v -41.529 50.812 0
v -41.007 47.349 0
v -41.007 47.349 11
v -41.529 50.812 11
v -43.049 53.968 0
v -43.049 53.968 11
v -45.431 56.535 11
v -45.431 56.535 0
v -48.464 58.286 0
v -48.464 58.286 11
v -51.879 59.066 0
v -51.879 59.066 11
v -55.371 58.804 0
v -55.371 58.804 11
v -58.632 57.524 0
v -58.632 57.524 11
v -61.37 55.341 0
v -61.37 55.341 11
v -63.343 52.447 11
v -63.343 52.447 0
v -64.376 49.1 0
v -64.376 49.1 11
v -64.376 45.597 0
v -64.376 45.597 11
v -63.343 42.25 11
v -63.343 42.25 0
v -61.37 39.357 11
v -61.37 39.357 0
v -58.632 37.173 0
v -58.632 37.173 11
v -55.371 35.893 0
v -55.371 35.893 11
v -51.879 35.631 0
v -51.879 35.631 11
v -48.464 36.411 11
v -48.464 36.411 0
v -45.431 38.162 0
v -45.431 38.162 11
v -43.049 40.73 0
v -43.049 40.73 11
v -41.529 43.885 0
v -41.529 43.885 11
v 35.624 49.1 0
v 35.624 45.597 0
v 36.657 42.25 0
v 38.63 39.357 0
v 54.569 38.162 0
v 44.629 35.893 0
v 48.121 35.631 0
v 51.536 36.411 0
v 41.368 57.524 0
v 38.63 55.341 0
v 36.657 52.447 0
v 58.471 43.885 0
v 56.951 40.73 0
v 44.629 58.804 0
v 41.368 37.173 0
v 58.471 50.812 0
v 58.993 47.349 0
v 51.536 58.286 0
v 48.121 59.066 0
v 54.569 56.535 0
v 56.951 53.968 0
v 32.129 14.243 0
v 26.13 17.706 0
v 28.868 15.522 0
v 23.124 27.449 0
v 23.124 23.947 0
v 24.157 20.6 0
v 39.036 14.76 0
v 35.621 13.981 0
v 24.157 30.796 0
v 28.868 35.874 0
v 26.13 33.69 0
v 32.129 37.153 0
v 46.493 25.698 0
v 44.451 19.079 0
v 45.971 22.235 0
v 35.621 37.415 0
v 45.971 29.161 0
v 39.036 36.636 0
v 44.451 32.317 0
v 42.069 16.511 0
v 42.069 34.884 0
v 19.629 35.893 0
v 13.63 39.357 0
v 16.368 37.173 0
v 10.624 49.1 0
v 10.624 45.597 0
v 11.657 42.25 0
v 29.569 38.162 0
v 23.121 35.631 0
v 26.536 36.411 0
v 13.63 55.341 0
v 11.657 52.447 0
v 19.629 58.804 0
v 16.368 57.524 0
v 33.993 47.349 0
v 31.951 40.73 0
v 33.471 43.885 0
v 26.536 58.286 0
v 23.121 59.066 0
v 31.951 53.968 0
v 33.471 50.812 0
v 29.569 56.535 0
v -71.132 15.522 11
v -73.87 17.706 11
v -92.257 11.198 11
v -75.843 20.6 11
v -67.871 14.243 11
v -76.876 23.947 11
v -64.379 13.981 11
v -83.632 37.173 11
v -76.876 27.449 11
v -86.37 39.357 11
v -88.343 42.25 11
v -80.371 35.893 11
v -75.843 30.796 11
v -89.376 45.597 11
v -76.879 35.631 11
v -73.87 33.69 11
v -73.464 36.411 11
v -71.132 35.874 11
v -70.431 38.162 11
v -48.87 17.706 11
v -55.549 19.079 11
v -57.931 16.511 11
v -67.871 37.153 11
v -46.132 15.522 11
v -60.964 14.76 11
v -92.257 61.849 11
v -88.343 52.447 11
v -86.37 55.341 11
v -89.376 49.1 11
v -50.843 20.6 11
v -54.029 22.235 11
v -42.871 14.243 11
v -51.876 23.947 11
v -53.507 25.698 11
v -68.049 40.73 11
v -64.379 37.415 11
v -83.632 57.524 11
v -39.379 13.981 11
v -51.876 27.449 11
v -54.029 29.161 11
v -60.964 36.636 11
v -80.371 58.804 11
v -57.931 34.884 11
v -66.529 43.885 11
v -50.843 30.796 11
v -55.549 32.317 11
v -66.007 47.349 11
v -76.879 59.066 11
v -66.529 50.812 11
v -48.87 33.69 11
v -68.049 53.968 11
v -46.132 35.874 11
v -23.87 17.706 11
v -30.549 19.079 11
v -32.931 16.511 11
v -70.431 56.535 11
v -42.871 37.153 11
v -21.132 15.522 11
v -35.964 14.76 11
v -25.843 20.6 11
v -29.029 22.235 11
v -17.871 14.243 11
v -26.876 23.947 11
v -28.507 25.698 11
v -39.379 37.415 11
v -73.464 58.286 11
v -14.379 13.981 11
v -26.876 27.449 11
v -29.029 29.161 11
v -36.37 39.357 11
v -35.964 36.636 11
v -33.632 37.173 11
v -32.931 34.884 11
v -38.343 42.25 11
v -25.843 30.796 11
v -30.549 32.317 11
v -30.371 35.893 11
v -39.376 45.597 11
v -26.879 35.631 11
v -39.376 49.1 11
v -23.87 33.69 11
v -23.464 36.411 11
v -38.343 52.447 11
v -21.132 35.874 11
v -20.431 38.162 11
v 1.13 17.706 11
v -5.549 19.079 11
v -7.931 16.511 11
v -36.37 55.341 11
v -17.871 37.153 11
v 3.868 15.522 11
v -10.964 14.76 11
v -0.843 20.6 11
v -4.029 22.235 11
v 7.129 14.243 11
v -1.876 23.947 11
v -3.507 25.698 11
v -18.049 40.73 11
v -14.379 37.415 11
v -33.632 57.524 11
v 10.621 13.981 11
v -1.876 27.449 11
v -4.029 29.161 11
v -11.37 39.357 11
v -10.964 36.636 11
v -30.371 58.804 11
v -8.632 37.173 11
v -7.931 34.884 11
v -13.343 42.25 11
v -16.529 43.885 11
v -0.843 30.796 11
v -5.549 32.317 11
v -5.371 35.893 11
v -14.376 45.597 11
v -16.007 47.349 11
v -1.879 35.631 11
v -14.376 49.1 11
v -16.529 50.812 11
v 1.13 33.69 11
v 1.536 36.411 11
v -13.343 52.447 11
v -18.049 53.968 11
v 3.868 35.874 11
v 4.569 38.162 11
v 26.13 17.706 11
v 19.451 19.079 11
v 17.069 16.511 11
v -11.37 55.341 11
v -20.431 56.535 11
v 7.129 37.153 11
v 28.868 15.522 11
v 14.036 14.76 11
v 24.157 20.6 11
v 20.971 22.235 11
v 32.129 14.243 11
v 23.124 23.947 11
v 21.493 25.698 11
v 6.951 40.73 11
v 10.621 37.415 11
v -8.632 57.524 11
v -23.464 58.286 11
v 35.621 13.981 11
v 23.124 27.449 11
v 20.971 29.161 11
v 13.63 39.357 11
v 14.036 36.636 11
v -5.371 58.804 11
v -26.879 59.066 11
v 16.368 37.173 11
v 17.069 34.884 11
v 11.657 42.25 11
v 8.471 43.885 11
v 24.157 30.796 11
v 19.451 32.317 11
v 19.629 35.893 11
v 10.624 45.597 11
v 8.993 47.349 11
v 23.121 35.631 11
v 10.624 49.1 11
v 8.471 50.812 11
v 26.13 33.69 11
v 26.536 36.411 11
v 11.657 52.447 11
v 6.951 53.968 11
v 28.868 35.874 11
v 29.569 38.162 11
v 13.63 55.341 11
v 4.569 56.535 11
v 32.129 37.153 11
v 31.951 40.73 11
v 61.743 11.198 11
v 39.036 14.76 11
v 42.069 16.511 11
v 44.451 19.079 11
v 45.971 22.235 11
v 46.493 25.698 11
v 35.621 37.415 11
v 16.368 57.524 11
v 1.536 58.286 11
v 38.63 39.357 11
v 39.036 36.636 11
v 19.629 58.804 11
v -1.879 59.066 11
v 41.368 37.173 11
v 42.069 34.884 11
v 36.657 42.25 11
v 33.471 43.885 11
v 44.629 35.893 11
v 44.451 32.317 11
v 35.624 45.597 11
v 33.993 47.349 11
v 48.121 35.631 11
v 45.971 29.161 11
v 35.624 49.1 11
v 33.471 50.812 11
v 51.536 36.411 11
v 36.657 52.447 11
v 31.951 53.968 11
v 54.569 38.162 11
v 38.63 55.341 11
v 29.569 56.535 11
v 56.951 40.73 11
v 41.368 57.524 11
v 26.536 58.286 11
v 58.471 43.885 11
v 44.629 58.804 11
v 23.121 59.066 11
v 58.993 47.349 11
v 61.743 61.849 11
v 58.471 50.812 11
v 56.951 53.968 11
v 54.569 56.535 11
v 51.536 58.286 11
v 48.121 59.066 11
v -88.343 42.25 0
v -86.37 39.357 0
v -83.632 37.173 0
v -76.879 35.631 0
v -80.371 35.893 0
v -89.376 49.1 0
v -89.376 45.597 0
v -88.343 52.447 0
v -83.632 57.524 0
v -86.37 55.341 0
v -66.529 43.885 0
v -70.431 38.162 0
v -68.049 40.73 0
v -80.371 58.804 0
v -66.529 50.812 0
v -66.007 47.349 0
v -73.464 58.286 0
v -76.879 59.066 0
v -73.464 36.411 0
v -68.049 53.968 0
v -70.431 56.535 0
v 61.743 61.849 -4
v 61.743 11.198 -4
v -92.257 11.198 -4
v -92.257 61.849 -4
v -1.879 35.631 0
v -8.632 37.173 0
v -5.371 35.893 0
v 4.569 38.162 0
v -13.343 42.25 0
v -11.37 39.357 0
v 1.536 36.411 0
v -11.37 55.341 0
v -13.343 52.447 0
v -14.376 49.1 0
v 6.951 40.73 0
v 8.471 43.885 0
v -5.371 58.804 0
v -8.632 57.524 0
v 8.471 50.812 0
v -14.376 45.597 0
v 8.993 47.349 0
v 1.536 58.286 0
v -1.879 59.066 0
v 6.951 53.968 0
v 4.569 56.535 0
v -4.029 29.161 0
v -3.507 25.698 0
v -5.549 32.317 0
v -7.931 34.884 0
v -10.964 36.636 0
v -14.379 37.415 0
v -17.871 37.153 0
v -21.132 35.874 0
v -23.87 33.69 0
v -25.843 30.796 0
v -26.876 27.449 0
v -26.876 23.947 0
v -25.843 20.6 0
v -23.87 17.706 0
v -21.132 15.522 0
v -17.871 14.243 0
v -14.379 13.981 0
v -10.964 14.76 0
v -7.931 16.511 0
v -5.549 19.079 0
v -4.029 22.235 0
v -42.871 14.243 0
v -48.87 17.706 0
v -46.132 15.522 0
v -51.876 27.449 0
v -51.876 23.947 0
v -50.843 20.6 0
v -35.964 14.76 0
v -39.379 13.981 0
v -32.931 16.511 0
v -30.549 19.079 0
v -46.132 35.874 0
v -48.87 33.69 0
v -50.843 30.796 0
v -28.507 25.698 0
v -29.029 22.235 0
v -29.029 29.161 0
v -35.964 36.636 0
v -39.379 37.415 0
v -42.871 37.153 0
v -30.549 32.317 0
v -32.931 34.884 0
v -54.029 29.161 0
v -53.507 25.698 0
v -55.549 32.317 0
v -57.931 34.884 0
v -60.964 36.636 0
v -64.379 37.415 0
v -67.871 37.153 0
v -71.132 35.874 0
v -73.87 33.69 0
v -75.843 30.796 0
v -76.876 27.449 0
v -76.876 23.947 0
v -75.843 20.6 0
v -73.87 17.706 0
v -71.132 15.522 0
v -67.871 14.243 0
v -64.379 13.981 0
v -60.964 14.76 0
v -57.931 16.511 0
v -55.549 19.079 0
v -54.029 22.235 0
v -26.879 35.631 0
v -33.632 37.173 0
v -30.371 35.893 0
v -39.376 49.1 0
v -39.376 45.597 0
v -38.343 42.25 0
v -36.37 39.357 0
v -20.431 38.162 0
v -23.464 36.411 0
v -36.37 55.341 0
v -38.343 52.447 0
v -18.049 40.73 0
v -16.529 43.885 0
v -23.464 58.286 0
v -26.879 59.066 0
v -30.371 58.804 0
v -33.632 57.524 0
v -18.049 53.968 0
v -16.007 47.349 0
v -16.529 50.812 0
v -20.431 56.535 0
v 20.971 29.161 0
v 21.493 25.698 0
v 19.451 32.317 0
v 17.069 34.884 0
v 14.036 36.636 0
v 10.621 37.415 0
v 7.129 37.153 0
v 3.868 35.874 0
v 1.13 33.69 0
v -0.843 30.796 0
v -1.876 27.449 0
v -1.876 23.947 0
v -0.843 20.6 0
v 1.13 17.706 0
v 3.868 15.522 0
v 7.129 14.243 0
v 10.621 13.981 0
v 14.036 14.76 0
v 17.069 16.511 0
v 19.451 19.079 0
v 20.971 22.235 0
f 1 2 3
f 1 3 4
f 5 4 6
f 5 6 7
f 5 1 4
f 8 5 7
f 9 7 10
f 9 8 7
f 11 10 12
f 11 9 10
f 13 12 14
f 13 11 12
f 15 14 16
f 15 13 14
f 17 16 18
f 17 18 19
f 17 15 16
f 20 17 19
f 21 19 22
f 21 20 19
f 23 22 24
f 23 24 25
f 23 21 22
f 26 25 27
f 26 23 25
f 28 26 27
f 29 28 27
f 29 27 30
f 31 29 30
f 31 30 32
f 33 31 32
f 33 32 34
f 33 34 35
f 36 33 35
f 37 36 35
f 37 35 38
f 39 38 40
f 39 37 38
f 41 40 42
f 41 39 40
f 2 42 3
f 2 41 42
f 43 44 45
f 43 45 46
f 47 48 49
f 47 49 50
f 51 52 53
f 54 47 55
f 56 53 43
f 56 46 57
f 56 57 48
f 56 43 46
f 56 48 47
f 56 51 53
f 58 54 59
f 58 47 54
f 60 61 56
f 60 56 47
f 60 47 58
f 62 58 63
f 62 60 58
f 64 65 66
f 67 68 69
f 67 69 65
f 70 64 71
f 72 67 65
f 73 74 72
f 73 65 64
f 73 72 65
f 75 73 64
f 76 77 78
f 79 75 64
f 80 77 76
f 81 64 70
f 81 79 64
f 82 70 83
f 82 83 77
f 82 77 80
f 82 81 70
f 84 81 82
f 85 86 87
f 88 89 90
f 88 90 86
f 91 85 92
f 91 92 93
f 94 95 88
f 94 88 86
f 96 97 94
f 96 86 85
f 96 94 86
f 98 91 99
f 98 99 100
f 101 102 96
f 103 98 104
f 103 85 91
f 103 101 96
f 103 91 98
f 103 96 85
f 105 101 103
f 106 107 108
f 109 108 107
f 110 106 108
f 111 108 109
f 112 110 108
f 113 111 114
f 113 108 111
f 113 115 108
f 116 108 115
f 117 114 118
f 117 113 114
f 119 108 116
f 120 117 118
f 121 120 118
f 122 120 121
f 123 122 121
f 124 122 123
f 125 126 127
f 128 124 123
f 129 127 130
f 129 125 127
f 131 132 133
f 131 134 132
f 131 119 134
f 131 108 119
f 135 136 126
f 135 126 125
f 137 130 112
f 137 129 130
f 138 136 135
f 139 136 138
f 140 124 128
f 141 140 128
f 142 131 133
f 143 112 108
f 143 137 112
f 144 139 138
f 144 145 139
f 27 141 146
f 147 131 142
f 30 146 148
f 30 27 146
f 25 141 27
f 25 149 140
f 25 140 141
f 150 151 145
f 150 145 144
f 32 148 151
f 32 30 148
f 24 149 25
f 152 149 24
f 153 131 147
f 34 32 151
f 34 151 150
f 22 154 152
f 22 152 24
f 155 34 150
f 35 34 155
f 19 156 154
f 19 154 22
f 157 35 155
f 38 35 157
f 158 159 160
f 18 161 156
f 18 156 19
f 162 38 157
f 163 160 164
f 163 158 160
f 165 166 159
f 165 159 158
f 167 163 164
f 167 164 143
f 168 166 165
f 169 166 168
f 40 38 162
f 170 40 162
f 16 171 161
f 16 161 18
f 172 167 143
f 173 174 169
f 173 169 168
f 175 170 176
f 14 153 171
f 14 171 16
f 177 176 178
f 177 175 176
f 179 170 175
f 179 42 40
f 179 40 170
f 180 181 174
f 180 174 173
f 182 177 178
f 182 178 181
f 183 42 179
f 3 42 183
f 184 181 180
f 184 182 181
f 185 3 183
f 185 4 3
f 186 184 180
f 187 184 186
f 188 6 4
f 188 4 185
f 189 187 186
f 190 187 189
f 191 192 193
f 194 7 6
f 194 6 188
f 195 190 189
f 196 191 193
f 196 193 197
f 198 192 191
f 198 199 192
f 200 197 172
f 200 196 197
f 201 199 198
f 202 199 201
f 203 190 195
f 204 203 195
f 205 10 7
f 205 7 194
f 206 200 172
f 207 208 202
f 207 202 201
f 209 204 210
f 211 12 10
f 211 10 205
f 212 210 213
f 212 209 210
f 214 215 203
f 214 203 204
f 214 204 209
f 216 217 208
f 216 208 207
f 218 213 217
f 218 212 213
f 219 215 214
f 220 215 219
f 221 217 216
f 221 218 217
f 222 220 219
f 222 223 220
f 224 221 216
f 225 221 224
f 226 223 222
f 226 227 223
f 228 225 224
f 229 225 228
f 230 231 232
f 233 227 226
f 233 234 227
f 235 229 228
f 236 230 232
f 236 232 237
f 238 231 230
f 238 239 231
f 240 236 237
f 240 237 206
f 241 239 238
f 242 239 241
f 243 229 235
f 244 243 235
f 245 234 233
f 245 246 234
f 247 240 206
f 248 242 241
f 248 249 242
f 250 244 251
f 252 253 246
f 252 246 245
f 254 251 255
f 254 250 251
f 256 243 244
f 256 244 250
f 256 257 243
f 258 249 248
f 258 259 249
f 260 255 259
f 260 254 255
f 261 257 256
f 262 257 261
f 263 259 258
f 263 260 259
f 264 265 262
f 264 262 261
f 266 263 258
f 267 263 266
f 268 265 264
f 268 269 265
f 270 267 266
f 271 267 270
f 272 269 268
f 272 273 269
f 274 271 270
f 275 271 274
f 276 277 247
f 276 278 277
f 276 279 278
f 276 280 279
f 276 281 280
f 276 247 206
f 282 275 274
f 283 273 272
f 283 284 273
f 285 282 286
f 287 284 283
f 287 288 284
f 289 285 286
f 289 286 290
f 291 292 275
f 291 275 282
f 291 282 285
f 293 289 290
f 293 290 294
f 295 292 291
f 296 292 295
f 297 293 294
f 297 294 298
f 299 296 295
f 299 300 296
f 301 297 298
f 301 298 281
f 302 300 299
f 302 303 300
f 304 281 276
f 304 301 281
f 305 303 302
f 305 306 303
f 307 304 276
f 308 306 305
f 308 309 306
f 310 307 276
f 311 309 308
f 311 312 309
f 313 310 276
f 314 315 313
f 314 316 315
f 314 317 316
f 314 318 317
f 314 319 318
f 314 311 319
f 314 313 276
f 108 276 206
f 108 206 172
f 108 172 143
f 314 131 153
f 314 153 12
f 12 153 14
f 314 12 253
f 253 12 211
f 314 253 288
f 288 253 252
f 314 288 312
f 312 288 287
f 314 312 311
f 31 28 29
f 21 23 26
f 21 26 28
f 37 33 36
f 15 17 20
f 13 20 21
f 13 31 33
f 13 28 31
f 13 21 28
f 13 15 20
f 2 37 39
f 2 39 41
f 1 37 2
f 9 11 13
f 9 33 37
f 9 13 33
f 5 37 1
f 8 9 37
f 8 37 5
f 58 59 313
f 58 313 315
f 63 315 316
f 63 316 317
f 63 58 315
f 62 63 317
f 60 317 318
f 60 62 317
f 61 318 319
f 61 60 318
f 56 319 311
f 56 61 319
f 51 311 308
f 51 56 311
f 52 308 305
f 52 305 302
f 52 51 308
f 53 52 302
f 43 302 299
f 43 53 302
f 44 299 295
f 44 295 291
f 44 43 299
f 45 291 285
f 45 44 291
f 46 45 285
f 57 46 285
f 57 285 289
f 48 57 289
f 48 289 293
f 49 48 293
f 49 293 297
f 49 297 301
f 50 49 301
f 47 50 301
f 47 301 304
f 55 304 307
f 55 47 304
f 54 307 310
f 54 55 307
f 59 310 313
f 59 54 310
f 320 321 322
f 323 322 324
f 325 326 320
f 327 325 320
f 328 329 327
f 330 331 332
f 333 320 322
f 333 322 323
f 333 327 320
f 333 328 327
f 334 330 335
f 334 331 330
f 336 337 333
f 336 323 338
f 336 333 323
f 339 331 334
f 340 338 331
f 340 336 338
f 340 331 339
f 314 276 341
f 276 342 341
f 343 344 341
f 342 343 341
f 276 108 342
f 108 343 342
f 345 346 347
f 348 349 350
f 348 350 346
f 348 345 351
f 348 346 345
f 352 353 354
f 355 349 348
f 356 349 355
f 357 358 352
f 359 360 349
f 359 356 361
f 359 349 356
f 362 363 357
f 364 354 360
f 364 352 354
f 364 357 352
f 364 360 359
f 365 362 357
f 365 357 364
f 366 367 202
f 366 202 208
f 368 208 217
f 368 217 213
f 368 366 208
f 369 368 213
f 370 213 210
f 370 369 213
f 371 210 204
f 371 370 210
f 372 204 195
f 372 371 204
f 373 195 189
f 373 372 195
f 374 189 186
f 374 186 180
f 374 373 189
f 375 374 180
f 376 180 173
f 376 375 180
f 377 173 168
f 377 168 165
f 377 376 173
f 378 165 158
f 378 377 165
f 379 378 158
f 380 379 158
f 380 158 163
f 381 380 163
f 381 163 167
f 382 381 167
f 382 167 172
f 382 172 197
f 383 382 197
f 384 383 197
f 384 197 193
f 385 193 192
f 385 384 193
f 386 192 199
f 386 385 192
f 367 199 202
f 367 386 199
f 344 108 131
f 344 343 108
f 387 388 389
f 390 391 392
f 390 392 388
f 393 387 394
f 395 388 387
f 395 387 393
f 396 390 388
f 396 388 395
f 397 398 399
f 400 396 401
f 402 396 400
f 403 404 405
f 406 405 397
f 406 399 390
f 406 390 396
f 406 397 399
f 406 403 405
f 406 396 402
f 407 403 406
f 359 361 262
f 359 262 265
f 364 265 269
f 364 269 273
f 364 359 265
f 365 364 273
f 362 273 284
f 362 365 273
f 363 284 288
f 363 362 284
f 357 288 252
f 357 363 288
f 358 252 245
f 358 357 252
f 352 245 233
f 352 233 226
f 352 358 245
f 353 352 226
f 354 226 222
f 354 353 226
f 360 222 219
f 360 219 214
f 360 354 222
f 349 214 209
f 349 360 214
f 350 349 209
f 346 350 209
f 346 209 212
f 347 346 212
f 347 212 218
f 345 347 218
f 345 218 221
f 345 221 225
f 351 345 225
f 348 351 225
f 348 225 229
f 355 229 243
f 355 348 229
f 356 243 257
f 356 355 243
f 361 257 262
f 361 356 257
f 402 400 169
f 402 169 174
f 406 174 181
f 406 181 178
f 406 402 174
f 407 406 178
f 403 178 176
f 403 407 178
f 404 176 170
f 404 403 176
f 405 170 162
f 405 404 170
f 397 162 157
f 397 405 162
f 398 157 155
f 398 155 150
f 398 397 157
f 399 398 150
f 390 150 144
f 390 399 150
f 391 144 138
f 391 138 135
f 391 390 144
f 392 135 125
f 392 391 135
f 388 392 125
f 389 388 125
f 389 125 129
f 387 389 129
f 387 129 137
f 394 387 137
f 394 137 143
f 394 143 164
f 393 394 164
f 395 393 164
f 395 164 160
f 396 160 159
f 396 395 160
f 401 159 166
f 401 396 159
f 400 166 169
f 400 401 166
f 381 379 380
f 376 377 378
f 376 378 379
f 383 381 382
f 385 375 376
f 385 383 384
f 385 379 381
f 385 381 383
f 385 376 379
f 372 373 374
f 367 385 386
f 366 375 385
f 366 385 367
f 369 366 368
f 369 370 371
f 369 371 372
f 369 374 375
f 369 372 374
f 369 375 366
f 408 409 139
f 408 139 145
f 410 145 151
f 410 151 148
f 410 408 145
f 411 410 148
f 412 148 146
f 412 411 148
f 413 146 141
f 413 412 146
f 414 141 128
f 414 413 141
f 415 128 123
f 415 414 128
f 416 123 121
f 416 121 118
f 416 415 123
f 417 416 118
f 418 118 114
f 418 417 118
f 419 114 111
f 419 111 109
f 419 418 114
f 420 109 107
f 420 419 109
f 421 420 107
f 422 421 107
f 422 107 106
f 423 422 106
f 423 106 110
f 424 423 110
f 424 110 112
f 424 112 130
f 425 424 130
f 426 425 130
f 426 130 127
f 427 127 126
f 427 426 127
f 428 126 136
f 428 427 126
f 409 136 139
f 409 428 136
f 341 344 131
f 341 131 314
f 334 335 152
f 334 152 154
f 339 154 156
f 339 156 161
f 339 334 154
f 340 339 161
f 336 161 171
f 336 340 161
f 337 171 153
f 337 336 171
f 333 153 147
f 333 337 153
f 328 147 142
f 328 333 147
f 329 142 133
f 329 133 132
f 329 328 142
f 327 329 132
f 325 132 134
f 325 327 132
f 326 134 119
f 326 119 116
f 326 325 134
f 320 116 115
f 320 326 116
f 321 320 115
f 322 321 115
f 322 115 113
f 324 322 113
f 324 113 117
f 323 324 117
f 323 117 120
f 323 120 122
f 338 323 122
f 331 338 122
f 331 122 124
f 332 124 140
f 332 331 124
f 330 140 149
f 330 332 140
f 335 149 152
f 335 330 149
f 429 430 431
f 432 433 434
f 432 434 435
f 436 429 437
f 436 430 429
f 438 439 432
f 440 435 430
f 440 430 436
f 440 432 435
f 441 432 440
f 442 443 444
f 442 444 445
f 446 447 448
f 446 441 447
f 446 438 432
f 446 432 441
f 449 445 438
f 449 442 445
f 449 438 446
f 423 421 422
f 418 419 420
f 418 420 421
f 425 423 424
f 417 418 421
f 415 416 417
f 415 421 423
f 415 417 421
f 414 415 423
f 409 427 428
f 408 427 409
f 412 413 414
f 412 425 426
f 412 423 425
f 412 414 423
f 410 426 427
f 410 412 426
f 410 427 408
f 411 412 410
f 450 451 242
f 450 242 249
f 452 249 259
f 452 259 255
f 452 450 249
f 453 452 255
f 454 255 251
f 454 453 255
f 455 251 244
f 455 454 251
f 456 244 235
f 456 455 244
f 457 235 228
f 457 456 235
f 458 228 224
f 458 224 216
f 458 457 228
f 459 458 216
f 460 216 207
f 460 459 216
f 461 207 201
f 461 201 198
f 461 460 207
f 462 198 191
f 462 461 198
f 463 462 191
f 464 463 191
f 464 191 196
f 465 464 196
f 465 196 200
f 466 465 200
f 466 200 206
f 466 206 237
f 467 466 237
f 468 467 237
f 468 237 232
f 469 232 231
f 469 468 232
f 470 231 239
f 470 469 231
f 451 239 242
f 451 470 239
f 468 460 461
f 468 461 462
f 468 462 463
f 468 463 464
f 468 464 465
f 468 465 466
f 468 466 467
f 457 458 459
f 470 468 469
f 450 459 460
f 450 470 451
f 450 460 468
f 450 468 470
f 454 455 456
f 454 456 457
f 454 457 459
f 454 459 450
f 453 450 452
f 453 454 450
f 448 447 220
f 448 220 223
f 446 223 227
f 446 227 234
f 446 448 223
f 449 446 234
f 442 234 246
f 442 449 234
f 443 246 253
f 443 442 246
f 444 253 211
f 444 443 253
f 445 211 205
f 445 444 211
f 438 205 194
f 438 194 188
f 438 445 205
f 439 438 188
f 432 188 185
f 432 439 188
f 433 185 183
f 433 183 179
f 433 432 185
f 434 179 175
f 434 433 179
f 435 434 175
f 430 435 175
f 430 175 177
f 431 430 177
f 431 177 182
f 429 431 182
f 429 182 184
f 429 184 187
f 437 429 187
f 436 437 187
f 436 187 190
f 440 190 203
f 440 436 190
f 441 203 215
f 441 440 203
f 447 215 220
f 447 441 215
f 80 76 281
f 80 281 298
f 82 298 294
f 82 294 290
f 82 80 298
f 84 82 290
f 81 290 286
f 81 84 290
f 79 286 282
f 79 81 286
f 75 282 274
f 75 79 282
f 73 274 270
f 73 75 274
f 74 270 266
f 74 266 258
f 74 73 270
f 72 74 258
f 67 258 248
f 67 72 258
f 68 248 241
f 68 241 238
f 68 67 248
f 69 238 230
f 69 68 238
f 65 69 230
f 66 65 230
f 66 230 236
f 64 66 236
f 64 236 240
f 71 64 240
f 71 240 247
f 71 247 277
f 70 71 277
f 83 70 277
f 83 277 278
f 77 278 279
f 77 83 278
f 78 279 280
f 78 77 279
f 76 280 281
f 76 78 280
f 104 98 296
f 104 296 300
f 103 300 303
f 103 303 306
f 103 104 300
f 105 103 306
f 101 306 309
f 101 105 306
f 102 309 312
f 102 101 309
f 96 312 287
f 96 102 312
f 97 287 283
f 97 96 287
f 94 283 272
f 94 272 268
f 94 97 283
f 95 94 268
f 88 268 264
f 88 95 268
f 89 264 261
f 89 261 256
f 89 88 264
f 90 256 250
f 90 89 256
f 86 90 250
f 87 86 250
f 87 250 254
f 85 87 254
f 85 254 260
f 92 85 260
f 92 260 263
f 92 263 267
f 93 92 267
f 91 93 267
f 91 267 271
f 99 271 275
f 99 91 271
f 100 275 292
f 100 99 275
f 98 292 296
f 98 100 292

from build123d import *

# Parameters (mm, degrees)
F0_W     = 154
F0_H     = 50.650635
F0_R     = 11.75
F1_DEPTH = 4
F2_DEPTH = 11


with BuildPart() as f1:
    # F0 (on Top) → F1 (new body)
    with BuildSketch(Plane.XY):
        with Locations((-15.256856, 36.523289)):
            Rectangle(F0_W, F0_H)
        with Locations((-65.256856, 25.697972)):
            Circle(F0_R, mode=Mode.SUBTRACT)
        with Locations((-40.256856, 25.697972)):
            Circle(F0_R, mode=Mode.SUBTRACT)
        with Locations((-15.256856, 25.697972)):
            Circle(F0_R, mode=Mode.SUBTRACT)
        with Locations((9.743144, 25.697972)):
            Circle(F0_R, mode=Mode.SUBTRACT)
        with Locations((34.743144, 25.697972)):
            Circle(F0_R, mode=Mode.SUBTRACT)
        with Locations((-77.756856, 47.348607)):
            Circle(F0_R, mode=Mode.SUBTRACT)
        with Locations((-52.756856, 47.348607)):
            Circle(F0_R, mode=Mode.SUBTRACT)
        with Locations((-27.756856, 47.348607)):
            Circle(F0_R, mode=Mode.SUBTRACT)
        with Locations((-2.756856, 47.348607)):
            Circle(F0_R, mode=Mode.SUBTRACT)
        with Locations((22.243144, 47.348607)):
            Circle(F0_R, mode=Mode.SUBTRACT)
        with Locations((47.243144, 47.348607)):
            Circle(F0_R, mode=Mode.SUBTRACT)
        with Locations((-77.756856, 47.348607)):
            Circle(F0_R)
        with Locations((-65.256856, 25.697972)):
            Circle(F0_R)
        with Locations((-52.756856, 47.348607)):
            Circle(F0_R)
        with Locations((-40.256856, 25.697972)):
            Circle(F0_R)
        with Locations((-27.756856, 47.348607)):
            Circle(F0_R)
        with Locations((-2.756856, 47.348607)):
            Circle(F0_R)
        with Locations((-15.256856, 25.697972)):
            Circle(F0_R)
        with Locations((9.743144, 25.697972)):
            Circle(F0_R)
        with Locations((47.243144, 47.348607)):
            Circle(F0_R)
        with Locations((34.743144, 25.697972)):
            Circle(F0_R)
        with Locations((22.243144, 47.348607)):
            Circle(F0_R)
    extrude(amount=-F1_DEPTH)

    # F0 (on Top) → F2 (join)
    with BuildSketch(Plane.XY):
        with Locations((-15.256856, 36.523289)):
            Rectangle(F0_W, F0_H)
        with Locations((-65.256856, 25.697972)):
            Circle(F0_R, mode=Mode.SUBTRACT)
        with Locations((-40.256856, 25.697972)):
            Circle(F0_R, mode=Mode.SUBTRACT)
        with Locations((-15.256856, 25.697972)):
            Circle(F0_R, mode=Mode.SUBTRACT)
        with Locations((9.743144, 25.697972)):
            Circle(F0_R, mode=Mode.SUBTRACT)
        with Locations((34.743144, 25.697972)):
            Circle(F0_R, mode=Mode.SUBTRACT)
        with Locations((-77.756856, 47.348607)):
            Circle(F0_R, mode=Mode.SUBTRACT)
        with Locations((-52.756856, 47.348607)):
            Circle(F0_R, mode=Mode.SUBTRACT)
        with Locations((-27.756856, 47.348607)):
            Circle(F0_R, mode=Mode.SUBTRACT)
        with Locations((-2.756856, 47.348607)):
            Circle(F0_R, mode=Mode.SUBTRACT)
        with Locations((22.243144, 47.348607)):
            Circle(F0_R, mode=Mode.SUBTRACT)
        with Locations((47.243144, 47.348607)):
            Circle(F0_R, mode=Mode.SUBTRACT)
    extrude(amount=F2_DEPTH)


solid = f1.part
